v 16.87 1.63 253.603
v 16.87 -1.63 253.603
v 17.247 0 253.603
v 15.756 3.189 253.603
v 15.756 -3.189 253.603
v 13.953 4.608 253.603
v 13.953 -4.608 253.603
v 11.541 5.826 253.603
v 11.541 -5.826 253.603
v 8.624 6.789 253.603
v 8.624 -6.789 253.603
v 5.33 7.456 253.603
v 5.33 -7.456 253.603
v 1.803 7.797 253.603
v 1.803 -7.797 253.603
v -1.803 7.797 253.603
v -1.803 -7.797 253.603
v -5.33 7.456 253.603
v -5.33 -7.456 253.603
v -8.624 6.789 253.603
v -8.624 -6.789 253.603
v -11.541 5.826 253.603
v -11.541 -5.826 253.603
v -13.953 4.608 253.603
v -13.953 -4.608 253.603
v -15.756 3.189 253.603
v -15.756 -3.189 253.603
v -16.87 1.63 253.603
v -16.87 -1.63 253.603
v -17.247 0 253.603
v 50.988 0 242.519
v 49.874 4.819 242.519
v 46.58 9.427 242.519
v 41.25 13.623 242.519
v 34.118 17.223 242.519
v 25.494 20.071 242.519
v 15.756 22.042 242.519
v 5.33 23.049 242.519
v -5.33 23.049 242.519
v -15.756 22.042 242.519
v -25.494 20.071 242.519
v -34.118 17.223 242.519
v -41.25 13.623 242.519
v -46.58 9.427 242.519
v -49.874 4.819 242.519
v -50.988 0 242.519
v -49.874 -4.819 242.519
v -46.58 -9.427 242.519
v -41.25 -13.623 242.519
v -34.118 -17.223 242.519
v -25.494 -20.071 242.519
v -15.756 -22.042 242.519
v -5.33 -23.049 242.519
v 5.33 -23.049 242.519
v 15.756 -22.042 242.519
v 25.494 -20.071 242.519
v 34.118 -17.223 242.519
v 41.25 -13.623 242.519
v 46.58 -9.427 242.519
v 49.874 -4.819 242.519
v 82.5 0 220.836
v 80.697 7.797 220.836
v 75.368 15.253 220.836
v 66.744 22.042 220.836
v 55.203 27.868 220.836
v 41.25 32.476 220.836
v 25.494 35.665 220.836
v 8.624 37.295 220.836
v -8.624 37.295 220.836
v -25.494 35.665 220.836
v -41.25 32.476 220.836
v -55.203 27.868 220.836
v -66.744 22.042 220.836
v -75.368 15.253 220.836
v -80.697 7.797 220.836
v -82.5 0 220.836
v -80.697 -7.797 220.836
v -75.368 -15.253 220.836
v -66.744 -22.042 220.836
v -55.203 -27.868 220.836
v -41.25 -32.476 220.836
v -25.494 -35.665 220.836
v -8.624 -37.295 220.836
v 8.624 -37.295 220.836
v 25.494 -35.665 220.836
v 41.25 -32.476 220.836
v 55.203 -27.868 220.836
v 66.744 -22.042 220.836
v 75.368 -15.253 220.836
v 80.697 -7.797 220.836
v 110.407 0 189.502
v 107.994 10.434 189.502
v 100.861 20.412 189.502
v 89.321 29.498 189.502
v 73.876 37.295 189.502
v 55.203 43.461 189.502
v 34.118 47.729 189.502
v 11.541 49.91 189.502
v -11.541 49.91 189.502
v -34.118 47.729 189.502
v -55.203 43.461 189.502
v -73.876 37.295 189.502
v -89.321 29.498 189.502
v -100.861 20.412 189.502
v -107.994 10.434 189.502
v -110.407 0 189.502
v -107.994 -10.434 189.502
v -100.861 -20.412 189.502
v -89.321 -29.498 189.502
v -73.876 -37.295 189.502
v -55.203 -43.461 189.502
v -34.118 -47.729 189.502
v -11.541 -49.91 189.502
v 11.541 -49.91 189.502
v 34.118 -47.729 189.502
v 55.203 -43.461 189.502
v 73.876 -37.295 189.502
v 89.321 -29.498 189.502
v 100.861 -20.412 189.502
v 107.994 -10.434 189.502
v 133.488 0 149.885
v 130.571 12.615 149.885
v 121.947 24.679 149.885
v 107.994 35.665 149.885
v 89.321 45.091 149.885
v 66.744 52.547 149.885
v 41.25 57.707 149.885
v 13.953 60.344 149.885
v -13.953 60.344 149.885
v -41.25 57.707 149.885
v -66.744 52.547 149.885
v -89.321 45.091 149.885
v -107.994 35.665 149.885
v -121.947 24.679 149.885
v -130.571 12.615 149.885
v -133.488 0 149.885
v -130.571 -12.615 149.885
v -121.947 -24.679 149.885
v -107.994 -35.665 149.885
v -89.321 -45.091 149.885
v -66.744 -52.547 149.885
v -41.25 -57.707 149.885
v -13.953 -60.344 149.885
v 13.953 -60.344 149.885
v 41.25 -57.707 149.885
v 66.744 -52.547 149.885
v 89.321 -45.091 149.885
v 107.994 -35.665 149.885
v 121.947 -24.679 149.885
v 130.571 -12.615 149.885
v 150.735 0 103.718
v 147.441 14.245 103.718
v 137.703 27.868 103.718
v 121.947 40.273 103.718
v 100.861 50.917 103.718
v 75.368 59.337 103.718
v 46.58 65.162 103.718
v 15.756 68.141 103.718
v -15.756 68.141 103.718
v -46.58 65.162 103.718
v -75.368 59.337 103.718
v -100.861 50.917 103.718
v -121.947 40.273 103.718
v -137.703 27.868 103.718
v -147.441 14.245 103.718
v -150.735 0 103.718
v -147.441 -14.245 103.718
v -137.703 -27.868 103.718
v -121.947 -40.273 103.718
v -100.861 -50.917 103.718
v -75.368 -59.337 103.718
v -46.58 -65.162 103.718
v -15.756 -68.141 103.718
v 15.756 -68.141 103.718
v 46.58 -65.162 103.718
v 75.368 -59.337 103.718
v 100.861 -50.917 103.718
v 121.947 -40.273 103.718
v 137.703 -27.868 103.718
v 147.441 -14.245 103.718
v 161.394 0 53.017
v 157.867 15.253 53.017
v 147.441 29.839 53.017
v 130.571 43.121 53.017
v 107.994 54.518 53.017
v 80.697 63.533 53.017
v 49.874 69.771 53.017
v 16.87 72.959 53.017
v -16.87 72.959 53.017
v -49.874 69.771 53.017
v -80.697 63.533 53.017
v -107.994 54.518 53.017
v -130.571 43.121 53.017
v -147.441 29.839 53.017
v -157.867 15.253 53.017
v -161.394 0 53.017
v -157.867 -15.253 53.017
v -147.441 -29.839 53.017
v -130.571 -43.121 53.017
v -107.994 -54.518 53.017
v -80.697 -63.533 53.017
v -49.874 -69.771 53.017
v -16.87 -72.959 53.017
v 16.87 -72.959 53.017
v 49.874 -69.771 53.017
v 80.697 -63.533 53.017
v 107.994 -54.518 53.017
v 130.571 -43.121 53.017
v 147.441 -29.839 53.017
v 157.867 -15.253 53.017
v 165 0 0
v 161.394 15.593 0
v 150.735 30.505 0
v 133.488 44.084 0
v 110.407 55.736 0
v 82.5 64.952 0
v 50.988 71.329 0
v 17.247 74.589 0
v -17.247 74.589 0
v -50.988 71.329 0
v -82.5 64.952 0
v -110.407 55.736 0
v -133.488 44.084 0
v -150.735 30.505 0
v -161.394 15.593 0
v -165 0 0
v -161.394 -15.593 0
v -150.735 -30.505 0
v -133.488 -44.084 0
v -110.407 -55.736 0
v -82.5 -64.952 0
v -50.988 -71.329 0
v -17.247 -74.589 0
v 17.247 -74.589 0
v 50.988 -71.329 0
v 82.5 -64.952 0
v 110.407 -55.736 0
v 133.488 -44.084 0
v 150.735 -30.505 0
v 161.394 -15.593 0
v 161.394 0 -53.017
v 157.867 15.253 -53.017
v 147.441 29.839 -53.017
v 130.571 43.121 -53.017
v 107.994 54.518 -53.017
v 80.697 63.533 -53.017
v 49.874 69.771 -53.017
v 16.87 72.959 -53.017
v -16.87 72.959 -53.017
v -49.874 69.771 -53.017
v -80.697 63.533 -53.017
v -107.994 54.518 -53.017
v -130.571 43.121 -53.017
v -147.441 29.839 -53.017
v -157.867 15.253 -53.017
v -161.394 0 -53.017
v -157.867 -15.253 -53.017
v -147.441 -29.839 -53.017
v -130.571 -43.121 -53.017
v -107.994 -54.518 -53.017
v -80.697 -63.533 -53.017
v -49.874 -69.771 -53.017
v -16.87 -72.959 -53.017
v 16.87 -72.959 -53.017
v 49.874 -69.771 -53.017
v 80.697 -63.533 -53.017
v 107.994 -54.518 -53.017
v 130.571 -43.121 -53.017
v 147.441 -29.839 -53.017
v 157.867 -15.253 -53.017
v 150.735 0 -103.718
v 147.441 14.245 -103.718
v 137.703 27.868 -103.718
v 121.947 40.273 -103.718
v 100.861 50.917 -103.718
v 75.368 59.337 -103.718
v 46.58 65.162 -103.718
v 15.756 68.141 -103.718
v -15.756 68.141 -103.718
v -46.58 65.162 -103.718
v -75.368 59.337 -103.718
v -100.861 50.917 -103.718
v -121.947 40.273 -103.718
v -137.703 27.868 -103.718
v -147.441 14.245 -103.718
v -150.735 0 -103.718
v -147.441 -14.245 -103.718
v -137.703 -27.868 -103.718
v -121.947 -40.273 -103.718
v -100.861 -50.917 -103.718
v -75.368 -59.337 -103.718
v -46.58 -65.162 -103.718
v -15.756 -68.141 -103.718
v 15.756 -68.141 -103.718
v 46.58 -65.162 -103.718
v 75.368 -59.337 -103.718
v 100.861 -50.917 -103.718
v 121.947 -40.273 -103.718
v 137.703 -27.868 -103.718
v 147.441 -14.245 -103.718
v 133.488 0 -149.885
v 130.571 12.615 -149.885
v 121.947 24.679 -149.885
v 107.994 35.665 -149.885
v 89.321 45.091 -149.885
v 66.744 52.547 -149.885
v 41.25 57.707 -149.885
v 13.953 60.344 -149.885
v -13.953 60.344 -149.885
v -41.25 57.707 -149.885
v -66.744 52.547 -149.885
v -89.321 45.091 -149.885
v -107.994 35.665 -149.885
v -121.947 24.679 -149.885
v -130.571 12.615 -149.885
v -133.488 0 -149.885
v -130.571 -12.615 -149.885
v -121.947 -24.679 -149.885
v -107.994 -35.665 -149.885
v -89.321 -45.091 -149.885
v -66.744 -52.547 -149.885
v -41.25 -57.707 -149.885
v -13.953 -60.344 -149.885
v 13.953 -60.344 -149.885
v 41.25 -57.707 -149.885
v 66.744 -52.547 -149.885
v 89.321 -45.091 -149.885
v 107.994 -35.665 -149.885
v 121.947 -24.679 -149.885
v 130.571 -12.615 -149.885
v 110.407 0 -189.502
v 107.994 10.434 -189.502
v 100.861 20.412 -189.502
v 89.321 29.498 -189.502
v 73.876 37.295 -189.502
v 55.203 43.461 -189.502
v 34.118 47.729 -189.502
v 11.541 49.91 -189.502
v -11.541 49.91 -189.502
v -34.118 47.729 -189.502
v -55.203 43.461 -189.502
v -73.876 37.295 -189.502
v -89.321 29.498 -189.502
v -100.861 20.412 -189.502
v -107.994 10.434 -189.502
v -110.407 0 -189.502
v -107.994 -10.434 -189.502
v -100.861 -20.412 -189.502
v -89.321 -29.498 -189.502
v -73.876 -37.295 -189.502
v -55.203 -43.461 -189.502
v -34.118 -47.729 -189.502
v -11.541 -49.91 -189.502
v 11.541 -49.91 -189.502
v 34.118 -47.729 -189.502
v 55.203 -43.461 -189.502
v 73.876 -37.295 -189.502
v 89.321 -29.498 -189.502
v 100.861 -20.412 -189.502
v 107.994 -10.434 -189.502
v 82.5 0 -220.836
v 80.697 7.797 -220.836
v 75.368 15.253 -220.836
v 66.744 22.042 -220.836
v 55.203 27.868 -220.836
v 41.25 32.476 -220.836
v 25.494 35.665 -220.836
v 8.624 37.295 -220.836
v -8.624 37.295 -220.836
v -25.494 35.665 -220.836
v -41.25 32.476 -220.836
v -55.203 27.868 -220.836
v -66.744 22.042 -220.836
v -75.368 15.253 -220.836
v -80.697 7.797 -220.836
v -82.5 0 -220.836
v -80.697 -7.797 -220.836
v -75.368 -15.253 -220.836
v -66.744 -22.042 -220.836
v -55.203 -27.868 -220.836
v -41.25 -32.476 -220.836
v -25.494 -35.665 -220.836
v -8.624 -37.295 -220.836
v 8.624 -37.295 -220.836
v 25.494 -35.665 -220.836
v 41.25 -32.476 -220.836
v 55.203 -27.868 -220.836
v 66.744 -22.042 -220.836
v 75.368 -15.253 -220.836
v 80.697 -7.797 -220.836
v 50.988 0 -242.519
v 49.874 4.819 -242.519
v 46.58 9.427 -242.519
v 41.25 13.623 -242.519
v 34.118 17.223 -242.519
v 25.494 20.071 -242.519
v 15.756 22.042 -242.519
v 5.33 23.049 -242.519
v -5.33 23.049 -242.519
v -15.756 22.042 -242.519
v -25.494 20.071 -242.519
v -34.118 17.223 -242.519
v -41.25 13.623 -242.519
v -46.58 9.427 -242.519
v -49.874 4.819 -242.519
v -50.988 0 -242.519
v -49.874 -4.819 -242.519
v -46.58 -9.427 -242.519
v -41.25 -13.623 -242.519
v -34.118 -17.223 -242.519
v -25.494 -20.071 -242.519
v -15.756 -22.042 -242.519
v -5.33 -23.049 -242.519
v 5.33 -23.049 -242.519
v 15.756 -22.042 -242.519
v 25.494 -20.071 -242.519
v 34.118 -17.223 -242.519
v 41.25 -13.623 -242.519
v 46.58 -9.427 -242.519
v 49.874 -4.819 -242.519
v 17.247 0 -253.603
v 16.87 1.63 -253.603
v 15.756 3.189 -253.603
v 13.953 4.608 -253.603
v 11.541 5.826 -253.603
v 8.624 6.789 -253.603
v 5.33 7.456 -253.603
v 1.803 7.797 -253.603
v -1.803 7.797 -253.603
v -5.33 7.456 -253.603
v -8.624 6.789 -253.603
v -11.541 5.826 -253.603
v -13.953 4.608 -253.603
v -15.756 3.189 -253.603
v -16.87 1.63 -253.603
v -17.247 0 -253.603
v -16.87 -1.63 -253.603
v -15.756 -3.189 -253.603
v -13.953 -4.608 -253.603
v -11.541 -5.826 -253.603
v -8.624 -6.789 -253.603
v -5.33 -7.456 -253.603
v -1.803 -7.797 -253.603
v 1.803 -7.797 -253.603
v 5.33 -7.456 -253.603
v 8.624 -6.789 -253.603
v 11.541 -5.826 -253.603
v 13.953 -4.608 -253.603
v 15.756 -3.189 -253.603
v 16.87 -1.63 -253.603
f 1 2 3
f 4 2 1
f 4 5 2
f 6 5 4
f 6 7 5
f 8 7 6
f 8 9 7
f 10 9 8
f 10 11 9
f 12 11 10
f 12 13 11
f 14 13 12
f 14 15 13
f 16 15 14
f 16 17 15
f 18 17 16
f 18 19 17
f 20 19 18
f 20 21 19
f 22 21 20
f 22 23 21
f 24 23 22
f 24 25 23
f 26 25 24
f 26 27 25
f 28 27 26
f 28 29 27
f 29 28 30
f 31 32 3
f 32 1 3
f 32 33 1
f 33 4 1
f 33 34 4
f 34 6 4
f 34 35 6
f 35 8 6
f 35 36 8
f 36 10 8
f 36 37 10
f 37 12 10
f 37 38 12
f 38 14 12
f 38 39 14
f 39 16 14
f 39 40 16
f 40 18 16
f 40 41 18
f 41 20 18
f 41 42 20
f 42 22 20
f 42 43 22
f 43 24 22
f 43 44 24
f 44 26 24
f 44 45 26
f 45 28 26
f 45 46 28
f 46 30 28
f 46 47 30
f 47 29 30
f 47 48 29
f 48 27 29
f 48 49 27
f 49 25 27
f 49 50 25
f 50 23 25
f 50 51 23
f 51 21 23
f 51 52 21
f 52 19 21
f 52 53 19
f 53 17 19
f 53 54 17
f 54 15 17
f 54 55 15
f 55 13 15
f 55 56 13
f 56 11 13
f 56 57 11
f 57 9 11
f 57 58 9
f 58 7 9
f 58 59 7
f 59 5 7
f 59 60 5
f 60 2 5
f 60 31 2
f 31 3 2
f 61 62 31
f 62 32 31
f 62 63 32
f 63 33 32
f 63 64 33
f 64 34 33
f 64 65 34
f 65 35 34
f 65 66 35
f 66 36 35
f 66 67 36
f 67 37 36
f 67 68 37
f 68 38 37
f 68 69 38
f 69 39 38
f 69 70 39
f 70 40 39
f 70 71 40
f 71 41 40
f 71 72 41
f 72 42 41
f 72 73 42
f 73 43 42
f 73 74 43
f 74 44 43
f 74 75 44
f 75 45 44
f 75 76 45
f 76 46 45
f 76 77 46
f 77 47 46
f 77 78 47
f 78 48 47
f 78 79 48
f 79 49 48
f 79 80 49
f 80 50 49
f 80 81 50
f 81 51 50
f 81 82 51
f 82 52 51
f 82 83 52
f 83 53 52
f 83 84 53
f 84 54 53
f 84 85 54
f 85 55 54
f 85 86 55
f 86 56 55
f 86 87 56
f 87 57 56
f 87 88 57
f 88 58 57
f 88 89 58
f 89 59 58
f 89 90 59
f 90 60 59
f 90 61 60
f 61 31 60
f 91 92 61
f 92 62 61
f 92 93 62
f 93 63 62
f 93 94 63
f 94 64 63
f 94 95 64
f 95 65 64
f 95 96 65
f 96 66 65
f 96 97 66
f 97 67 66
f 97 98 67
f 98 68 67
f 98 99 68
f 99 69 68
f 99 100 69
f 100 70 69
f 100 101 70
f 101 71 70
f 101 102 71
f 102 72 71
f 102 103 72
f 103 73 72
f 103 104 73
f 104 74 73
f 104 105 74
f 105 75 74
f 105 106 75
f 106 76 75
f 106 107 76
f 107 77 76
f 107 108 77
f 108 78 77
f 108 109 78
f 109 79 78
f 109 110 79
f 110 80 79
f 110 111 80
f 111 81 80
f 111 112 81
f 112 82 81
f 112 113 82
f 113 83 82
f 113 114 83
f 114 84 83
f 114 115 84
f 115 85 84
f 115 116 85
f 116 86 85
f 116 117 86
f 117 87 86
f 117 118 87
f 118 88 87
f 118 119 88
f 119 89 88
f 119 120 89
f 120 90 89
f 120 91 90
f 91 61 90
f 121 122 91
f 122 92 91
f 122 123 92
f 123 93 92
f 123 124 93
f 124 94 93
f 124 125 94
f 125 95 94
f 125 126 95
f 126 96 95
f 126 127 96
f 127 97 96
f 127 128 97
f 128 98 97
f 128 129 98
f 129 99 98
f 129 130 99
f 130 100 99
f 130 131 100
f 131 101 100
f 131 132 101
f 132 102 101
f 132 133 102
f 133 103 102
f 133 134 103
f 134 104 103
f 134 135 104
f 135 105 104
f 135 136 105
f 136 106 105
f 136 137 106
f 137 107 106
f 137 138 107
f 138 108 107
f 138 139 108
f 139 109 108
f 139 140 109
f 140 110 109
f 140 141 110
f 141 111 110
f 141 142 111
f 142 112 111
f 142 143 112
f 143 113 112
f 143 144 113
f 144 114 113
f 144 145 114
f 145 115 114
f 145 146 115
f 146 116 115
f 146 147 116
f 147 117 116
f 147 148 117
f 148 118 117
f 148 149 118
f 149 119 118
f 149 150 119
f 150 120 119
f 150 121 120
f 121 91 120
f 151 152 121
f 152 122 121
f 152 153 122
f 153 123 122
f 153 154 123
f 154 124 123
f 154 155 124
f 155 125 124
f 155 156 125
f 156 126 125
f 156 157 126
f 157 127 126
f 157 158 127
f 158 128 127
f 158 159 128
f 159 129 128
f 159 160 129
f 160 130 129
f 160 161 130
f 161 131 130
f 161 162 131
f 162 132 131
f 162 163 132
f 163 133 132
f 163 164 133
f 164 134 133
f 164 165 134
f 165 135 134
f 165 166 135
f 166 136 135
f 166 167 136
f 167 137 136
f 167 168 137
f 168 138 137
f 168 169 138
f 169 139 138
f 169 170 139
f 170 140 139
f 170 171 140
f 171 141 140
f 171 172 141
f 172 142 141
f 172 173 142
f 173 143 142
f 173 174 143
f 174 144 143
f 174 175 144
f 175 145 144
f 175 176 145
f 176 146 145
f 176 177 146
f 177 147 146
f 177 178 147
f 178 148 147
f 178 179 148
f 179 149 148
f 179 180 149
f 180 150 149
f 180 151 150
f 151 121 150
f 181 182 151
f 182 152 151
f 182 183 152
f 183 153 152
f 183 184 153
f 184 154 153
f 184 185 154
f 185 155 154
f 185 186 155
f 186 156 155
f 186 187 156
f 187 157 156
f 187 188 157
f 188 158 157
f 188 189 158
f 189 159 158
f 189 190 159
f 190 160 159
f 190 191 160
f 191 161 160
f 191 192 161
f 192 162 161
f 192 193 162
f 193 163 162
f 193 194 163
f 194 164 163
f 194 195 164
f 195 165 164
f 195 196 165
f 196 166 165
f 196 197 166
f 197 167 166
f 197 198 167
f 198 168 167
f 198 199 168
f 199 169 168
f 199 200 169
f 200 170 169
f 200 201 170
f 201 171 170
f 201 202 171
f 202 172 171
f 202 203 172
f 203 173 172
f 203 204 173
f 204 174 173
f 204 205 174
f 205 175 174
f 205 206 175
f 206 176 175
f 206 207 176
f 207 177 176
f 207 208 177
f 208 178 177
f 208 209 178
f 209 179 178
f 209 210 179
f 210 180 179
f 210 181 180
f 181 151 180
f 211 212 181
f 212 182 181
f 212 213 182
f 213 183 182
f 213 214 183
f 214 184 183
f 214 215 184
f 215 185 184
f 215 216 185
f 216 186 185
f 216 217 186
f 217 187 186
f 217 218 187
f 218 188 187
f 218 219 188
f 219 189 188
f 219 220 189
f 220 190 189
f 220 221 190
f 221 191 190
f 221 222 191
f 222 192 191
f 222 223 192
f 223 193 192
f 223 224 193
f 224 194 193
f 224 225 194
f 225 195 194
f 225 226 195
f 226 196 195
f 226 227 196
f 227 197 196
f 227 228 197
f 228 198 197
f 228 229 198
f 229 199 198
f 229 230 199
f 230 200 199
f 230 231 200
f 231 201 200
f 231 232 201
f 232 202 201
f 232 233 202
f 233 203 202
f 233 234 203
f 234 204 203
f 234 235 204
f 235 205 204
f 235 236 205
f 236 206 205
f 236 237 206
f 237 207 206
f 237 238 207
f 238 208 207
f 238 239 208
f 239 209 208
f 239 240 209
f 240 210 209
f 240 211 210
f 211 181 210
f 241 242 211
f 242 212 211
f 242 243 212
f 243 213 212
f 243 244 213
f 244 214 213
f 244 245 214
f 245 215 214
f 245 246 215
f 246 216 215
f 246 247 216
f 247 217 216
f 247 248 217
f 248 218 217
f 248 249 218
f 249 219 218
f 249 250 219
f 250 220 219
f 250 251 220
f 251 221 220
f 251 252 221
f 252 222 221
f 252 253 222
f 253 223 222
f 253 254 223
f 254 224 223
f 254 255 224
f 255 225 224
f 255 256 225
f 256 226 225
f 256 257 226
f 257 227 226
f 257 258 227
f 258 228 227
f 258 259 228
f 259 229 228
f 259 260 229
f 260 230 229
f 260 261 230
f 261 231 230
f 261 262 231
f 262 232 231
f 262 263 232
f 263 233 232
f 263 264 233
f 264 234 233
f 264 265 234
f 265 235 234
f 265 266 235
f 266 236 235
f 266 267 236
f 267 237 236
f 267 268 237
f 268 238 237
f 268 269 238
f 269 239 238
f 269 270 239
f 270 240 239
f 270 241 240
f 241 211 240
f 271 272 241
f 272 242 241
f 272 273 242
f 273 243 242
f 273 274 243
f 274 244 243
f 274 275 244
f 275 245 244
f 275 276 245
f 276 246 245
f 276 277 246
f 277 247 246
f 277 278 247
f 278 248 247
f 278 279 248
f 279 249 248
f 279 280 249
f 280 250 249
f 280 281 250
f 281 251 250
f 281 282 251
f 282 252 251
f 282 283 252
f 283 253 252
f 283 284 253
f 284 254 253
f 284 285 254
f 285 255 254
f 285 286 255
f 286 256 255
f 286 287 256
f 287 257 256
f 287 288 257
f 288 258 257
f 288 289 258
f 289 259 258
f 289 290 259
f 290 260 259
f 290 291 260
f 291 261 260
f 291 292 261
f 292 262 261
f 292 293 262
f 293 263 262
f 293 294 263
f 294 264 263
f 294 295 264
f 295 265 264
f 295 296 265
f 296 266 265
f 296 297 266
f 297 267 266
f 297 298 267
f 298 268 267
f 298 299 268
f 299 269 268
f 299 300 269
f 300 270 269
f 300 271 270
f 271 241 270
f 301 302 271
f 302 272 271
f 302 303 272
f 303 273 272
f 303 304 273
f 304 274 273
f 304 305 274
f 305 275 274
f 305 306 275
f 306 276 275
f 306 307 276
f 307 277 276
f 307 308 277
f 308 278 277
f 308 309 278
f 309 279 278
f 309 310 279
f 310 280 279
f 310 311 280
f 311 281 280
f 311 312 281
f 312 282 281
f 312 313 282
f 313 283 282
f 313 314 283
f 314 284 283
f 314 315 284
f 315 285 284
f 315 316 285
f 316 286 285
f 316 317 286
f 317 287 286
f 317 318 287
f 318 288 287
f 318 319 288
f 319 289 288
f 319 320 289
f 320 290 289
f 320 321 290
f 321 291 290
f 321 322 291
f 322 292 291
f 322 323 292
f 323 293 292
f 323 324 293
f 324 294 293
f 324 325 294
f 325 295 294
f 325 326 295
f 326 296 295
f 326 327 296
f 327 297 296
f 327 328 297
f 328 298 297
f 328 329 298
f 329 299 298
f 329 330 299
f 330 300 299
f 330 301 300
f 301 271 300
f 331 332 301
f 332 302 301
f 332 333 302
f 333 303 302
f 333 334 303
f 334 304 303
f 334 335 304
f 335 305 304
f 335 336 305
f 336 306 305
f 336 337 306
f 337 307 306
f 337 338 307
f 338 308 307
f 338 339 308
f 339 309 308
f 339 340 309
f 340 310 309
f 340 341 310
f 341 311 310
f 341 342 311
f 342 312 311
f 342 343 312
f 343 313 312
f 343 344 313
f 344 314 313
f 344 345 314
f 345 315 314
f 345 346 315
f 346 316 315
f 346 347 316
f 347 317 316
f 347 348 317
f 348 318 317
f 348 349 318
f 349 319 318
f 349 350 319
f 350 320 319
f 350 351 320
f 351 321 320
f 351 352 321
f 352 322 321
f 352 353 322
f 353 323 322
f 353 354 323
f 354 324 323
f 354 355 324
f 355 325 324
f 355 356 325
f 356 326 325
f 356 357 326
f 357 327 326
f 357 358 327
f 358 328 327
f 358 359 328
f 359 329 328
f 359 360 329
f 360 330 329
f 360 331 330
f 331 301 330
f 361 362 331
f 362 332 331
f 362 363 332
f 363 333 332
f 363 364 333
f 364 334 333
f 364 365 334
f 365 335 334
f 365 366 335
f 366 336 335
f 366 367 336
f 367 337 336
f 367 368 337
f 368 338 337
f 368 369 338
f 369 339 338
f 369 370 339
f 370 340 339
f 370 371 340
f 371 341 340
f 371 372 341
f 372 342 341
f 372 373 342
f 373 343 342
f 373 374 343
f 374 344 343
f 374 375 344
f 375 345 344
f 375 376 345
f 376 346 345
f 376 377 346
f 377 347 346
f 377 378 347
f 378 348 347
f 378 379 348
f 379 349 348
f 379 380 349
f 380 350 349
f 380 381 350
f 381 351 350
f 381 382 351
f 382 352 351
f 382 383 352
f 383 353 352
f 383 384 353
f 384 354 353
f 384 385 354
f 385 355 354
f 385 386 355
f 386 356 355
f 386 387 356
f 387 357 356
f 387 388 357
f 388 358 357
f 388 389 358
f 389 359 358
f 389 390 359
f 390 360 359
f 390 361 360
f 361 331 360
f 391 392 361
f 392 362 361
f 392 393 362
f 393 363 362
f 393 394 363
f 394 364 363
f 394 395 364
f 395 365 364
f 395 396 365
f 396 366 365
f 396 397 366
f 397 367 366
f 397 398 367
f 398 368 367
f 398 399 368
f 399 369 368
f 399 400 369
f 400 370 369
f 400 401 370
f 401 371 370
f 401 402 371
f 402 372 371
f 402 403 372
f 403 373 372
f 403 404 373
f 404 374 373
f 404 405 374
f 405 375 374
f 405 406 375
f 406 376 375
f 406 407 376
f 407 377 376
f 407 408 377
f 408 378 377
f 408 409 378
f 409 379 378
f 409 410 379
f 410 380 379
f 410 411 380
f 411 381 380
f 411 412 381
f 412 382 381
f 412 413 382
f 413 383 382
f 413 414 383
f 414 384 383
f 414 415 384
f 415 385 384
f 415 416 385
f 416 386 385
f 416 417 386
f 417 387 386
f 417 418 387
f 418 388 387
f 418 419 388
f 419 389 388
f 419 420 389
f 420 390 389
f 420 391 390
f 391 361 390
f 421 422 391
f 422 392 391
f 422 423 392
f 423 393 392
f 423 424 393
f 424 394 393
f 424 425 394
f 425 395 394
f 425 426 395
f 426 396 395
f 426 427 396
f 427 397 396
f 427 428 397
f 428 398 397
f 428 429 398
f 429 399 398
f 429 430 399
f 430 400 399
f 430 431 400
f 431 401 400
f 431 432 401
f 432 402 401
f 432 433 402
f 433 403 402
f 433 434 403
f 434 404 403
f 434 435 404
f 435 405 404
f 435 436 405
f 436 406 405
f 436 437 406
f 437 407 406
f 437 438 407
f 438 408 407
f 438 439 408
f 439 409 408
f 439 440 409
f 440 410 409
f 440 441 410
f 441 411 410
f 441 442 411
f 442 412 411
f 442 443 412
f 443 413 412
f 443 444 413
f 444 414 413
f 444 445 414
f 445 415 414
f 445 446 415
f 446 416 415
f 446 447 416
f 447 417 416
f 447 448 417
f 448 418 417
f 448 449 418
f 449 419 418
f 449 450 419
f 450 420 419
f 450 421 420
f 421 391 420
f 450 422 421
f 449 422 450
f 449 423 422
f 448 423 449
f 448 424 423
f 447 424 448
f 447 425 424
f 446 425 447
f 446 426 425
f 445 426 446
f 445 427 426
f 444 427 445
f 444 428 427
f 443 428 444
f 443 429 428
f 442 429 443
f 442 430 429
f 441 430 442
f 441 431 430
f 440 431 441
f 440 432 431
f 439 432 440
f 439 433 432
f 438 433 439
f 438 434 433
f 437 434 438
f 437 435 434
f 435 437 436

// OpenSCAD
// Generated by SolidPython 1.0.1 on 2020-07-29 00:46:49


scale(v = [11, 5, 17]) {
	sphere(r = 15);
}
/***********************************************
*********      SolidPython code:      **********
************************************************
 
# import packages: SolidPython
from solid import *
from solid.utils import *
from itertools import chain, combinations, permutations


class Resize:

    def __init__(self, scad_file):
        self.scad_file = scad_file
        #self.scad_file = import_scad(scad_file)
        # cone/cylinder param:
        self.r1 = 0
        self.r2 = 0
        self.h = 0
        # rectangular prism param:
        self.w = 0
        self.l = 0
        # ellipse param:
        self.r = 0

    # import OpenScad code (file name corresponds to shape)


    # classify shape + parameters
    def assign(self, param1, param2, param3):
        if self.scad_file == 'cone.scad':
            self.r1 = param1
            self.r2 = param2
            self.h = param3
        elif self.scad_file == 'cylinder.scad':
            self.r1 = param1
            self.r2 = param2
            self.h = param3
        elif self.scad_file == 'rectangularPrism.scad':
            self.h = param1
            self.l = param2
            self.w = param3
        else:
            self.r = param1
            self.h = param2

    # resize parameters
    def iterate(self):
        x = range(3, 20, 2)
        i = 1
        if self.scad_file == 'cone.scad':
            tempList = list(permutations(x, 2))
            for temp in tempList:
                param1 = temp[0]
                param2 = temp[1]
                filepath = 'produced_scad_files/' + 'cone' + str(param1) + '_' + str(param2) + '_' + '.scad'
                scad_render_to_file(cylinder(h=param1, r1=param2, r2=0), filepath)

        elif self.scad_file == 'cylinder.scad':
            tempList = list(permutations(x, 3))
            for temp in tempList:
                param1 = temp[0]
                param2 = temp[1]
                filepath = 'produced_scad_files/' + 'cylinder' + str(param1) + '_' + str(param2) + '_' + '.scad'
                scad_render_to_file(cylinder(h=param1, r1=param2, r2=param2), filepath)

        elif self.scad_file == 'rectangularPrism.scad':
            tempList = list(permutations(x, 3))
            for temp in tempList:
                param1 = temp[0]
                param2 = temp[1]
                param3 = temp[2]
                filepath = 'produced_scad_files/' + 'rectangularPrism' + str(param1) + '_' + str(param2) + '_' + str(
                    param3) + '.scad'
                scad_render_to_file(cube(size=(param1, param2, param3)), filepath)

        elif self.scad_file == 'ellipse.scad':
            tempList = list(permutations(x, 4))
            for temp in tempList:
                param1 = temp[0]
                param2 = temp[1]
                param3 = temp[2]
                param4 = temp[3]
                filepath = 'produced_scad_files/' + 'ellipse' + str(param1) + '_' + str(param2) + '_' + str(param3) + '_' + str(param4) + '.scad'
                scad_render_to_file(scale([param1, param2, param3])(sphere(r=param4)), filepath)

    def render_to_scadfile(self):
        scad_render_to_file(scad, 'example.scad') 
 
************************************************/
